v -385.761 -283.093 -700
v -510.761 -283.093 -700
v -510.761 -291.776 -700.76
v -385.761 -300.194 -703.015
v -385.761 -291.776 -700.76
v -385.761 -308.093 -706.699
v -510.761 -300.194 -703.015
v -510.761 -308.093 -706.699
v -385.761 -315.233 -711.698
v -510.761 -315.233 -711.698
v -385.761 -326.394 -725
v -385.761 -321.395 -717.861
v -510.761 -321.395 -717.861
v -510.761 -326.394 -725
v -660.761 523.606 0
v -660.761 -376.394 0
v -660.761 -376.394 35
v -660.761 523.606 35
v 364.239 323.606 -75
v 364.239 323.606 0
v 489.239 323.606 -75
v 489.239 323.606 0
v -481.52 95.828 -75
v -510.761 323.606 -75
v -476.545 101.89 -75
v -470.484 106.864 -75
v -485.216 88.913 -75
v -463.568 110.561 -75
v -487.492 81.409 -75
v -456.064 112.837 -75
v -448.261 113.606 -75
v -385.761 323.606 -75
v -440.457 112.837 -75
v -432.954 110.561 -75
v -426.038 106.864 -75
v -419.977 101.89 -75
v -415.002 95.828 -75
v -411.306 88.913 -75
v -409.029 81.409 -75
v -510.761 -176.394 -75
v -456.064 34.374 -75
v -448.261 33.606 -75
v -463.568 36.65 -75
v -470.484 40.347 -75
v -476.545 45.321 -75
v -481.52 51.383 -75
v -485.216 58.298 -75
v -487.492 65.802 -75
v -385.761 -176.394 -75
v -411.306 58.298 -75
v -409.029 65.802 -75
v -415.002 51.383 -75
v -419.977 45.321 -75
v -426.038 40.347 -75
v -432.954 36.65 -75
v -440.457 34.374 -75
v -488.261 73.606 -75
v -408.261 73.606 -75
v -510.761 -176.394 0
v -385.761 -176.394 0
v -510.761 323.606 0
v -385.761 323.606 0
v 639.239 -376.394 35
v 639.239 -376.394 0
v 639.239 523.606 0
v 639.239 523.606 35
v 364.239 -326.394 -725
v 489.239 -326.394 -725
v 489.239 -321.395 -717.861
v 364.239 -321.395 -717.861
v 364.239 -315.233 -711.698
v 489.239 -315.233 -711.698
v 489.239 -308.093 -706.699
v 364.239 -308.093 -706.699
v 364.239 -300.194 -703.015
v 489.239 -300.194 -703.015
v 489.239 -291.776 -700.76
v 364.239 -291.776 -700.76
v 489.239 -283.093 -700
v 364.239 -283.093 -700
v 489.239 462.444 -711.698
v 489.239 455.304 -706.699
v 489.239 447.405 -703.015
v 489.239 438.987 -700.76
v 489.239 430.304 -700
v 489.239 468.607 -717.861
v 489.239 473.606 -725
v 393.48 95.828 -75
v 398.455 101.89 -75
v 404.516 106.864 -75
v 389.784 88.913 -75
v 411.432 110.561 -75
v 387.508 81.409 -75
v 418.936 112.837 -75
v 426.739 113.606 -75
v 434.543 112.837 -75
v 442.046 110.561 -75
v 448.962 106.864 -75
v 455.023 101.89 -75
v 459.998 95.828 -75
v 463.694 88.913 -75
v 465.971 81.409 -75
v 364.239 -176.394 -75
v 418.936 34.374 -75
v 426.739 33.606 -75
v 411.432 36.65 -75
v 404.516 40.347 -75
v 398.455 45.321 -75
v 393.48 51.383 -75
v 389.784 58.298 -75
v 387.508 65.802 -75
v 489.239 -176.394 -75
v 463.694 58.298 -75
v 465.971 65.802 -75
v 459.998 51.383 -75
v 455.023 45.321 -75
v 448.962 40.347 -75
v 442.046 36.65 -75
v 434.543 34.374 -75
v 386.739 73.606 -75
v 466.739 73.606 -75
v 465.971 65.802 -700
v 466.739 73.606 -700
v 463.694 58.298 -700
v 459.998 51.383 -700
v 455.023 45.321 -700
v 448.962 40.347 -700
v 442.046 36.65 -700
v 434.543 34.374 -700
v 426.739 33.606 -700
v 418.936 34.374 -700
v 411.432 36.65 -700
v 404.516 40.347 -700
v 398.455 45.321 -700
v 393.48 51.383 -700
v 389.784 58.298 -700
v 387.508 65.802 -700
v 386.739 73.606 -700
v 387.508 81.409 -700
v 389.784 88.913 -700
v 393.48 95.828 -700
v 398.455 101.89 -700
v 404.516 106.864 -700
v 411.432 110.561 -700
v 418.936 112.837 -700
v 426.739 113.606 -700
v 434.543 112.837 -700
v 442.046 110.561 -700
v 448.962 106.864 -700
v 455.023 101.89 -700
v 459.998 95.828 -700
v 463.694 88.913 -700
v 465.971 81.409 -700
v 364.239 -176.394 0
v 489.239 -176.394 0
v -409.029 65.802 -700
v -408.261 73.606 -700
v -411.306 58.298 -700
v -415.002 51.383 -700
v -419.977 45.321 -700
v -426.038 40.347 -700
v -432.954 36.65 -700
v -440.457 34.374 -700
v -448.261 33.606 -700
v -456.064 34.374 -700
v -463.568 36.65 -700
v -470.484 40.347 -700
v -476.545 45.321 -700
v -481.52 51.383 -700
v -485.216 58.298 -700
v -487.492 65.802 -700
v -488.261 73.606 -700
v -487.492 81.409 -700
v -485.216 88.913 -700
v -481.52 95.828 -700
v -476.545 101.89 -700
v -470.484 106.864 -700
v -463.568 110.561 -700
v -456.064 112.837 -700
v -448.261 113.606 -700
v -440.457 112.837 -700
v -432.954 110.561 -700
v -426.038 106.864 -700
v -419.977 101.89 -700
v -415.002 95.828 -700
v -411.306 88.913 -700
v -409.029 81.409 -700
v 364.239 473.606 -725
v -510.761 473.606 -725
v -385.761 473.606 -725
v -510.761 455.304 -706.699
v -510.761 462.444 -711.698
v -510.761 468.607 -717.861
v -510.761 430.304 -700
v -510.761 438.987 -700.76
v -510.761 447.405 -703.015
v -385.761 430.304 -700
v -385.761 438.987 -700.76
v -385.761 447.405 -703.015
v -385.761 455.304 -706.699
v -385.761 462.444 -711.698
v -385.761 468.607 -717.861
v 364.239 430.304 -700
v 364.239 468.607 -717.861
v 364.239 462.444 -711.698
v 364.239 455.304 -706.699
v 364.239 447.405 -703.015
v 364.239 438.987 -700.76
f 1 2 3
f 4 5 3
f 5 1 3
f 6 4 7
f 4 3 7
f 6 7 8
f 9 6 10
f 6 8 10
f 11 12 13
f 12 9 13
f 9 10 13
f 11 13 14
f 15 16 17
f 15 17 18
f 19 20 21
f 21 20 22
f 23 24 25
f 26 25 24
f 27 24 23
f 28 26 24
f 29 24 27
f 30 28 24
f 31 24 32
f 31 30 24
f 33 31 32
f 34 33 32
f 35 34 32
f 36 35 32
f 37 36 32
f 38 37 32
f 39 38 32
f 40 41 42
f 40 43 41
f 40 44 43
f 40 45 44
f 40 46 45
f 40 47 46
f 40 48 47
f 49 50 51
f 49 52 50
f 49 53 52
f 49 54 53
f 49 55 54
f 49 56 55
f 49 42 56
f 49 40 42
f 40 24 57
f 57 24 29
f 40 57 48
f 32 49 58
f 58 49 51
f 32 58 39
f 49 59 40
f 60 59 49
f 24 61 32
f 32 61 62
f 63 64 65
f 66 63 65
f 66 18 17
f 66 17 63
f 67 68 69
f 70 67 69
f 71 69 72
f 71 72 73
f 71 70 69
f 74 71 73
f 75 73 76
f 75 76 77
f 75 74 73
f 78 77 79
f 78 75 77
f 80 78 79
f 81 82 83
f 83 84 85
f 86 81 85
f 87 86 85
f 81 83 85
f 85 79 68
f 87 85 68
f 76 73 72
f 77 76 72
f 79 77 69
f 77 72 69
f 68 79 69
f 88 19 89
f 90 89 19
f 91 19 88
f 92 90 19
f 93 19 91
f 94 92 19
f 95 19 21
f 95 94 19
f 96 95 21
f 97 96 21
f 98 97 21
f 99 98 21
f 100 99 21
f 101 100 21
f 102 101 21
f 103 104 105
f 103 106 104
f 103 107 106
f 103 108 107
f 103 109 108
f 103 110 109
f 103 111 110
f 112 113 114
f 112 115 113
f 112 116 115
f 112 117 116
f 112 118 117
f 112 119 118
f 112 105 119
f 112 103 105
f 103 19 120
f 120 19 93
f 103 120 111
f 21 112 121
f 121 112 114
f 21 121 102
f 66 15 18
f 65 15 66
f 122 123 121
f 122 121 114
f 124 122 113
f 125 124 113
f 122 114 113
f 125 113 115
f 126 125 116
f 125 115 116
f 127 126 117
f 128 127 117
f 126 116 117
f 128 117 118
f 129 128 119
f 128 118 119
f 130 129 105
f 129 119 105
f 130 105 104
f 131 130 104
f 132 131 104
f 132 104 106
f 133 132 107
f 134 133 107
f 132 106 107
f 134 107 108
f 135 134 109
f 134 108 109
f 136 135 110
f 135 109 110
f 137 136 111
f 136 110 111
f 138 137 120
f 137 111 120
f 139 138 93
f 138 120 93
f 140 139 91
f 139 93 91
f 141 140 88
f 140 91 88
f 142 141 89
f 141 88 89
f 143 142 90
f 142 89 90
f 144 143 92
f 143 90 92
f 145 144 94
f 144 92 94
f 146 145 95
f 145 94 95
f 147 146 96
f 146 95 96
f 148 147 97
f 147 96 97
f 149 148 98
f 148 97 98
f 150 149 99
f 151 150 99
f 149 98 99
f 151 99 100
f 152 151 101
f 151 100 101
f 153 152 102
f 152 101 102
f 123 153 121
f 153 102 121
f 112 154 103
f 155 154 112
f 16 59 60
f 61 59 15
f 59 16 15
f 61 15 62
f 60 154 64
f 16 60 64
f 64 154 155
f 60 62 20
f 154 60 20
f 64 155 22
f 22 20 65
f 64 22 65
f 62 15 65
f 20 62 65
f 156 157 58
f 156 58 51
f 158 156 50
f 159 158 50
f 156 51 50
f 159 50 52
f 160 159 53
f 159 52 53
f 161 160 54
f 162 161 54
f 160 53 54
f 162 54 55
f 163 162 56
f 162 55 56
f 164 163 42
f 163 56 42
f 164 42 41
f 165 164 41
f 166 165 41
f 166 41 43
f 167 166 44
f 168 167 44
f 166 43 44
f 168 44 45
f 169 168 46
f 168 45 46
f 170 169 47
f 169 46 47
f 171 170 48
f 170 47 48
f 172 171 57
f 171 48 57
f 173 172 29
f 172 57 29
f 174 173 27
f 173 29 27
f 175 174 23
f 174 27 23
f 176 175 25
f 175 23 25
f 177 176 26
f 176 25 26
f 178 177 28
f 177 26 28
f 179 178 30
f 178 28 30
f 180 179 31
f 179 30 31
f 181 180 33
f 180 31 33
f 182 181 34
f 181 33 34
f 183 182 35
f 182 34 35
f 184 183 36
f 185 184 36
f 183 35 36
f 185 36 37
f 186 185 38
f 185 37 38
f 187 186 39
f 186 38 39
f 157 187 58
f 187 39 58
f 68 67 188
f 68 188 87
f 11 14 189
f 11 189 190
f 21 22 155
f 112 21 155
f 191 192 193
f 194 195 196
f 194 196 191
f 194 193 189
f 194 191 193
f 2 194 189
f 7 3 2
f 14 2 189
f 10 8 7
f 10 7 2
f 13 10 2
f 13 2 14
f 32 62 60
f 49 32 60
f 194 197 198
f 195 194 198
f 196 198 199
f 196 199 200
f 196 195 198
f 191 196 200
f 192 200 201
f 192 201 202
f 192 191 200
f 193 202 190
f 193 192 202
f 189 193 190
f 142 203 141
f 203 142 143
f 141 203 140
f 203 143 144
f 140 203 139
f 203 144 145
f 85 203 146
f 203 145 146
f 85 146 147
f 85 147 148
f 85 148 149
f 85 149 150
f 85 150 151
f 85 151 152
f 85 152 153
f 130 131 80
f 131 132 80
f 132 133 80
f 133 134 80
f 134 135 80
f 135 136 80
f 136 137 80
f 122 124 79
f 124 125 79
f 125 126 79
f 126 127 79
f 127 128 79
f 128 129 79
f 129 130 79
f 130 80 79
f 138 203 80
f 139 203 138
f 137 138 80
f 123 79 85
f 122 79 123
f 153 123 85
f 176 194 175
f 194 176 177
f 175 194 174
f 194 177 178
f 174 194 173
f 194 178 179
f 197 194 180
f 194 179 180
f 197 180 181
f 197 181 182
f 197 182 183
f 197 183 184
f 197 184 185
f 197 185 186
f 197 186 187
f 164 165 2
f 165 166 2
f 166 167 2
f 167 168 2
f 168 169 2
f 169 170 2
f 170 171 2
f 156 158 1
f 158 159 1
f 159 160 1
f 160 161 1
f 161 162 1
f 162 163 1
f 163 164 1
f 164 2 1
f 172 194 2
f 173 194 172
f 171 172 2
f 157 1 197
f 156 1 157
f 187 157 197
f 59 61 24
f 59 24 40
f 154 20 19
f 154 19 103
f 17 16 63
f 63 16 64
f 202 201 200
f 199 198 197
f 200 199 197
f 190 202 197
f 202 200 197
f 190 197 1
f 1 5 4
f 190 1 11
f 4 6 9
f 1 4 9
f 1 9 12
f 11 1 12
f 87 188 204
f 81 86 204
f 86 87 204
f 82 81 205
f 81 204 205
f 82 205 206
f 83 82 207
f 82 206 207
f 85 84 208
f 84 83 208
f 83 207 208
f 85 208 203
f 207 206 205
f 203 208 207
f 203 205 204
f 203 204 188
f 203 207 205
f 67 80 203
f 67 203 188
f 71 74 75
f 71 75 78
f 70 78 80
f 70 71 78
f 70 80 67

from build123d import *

# Parameters (mm, degrees)
F0_W        = 1300
F0_H        = 900
F1_DEPTH    = 35
F2_W        = 125
F2_H        = 500
F3_DEPTH    = 75
F4_R        = 40
F5_R        = 40
F6_DEPTH    = 625
F7_W        = 125
F7_H        = 800
F7_R        = 40
F8_DEPTH    = 25
F9_T1_DEPTH = 341.5063509461
F9_T3_DEPTH = 341.5063509461


# Not quite as in the source:
# - a fillet or chamfer that OpenCascade refuses, or shapes differently, is made with other operations: its cross-section is extruded or revolved along the edge and cut away or added


with BuildPart() as f1:
    # F0 (on Top) → F1 (new body)
    with BuildSketch(Plane.XY):
        with Locations((-10.7608698308, 73.6055876629)):
            Rectangle(F0_W, F0_H)
    extrude(amount=F1_DEPTH)

    # F2 (on face) → F3 (join)
    with BuildSketch(Plane(origin=(0, 0, 0), x_dir=(1, 0, 0), z_dir=(0, 0, -1))):
        with Locations((-448.2608698308, -73.6055876629)):
            Rectangle(F2_W, F2_H)
        with Locations((426.7391301692, -73.6055876629)):
            Rectangle(F2_W, F2_H)
    extrude(amount=F3_DEPTH)

    # F4 (on face) + F5 (on face) → F6 (join)
    with BuildSketch(Plane(origin=(0, 0, -75), x_dir=(1, 0, 0), z_dir=(0, 0, -1))):
        with Locations((-448.2608698308, -73.6055876629)):
            Circle(F4_R)
    with BuildSketch(Plane(origin=(0, 0, -75), x_dir=(1, 0, 0), z_dir=(0, 0, -1))):
        with Locations((426.7391301692, -73.6055876629)):
            Circle(F5_R)
    extrude(amount=F6_DEPTH)

    # F7 (on face) → F8 (join)
    with BuildSketch(Plane(origin=(0, 0, -700), x_dir=(1, 0, 0), z_dir=(0, 0, -1))):
        with Locations((-448.2608698308, -73.6055876629)):
            Rectangle(F7_W, F7_H)
        with Locations((-448.2608698308, -73.6055876629)):
            Circle(F7_R, mode=Mode.SUBTRACT)
        with Locations((426.7391301692, -73.6055876629)):
            Rectangle(F7_W, F7_H)
        with Locations((-448.2608698308, -73.6055876629)):
            Circle(F7_R)
    extrude(amount=F8_DEPTH)

    # F9: fillet of radius 50 on 4 edges, made by hand

    # F9_s2 → F9_t1 (cut)
    with BuildSketch(Plane.YZ.offset(-619.0140453039)):
        with BuildLine():
            ThreePointArc((-283.0931421479, -700), (-308.0931421479, -706.6987298108), (-326.3944123371, -725))
            Line((-326.3944123371, -725), (-326.3944123371, -700))
            Line((-326.3944123371, -700), (-283.0931421479, -700))
        make_face()
        with BuildLine():
            ThreePointArc((430.3043174737, -700), (455.3043174737, -706.6987298108), (473.6055876629, -725))
            Line((473.6055876629, -725), (473.6055876629, -700))
            Line((473.6055876629, -700), (430.3043174737, -700))
        make_face()
    extrude(amount=F9_T1_DEPTH, mode=Mode.SUBTRACT)

    # F9_s4 → F9_t3 (cut)
    with BuildSketch(Plane.YZ.offset(255.9859546961)):
        with BuildLine():
            ThreePointArc((-326.3944123371, -725), (-308.0931421479, -706.6987298108), (-283.0931421479, -700))
            Line((-283.0931421479, -700), (-326.3944123371, -700))
            Line((-326.3944123371, -700), (-326.3944123371, -725))
        make_face()
        with BuildLine():
            ThreePointArc((473.6055876629, -725), (455.3043174737, -706.6987298108), (430.3043174737, -700))
            Line((430.3043174737, -700), (473.6055876629, -700))
            Line((473.6055876629, -700), (473.6055876629, -725))
        make_face()
    extrude(amount=F9_T3_DEPTH, mode=Mode.SUBTRACT)


solid = f1.part
